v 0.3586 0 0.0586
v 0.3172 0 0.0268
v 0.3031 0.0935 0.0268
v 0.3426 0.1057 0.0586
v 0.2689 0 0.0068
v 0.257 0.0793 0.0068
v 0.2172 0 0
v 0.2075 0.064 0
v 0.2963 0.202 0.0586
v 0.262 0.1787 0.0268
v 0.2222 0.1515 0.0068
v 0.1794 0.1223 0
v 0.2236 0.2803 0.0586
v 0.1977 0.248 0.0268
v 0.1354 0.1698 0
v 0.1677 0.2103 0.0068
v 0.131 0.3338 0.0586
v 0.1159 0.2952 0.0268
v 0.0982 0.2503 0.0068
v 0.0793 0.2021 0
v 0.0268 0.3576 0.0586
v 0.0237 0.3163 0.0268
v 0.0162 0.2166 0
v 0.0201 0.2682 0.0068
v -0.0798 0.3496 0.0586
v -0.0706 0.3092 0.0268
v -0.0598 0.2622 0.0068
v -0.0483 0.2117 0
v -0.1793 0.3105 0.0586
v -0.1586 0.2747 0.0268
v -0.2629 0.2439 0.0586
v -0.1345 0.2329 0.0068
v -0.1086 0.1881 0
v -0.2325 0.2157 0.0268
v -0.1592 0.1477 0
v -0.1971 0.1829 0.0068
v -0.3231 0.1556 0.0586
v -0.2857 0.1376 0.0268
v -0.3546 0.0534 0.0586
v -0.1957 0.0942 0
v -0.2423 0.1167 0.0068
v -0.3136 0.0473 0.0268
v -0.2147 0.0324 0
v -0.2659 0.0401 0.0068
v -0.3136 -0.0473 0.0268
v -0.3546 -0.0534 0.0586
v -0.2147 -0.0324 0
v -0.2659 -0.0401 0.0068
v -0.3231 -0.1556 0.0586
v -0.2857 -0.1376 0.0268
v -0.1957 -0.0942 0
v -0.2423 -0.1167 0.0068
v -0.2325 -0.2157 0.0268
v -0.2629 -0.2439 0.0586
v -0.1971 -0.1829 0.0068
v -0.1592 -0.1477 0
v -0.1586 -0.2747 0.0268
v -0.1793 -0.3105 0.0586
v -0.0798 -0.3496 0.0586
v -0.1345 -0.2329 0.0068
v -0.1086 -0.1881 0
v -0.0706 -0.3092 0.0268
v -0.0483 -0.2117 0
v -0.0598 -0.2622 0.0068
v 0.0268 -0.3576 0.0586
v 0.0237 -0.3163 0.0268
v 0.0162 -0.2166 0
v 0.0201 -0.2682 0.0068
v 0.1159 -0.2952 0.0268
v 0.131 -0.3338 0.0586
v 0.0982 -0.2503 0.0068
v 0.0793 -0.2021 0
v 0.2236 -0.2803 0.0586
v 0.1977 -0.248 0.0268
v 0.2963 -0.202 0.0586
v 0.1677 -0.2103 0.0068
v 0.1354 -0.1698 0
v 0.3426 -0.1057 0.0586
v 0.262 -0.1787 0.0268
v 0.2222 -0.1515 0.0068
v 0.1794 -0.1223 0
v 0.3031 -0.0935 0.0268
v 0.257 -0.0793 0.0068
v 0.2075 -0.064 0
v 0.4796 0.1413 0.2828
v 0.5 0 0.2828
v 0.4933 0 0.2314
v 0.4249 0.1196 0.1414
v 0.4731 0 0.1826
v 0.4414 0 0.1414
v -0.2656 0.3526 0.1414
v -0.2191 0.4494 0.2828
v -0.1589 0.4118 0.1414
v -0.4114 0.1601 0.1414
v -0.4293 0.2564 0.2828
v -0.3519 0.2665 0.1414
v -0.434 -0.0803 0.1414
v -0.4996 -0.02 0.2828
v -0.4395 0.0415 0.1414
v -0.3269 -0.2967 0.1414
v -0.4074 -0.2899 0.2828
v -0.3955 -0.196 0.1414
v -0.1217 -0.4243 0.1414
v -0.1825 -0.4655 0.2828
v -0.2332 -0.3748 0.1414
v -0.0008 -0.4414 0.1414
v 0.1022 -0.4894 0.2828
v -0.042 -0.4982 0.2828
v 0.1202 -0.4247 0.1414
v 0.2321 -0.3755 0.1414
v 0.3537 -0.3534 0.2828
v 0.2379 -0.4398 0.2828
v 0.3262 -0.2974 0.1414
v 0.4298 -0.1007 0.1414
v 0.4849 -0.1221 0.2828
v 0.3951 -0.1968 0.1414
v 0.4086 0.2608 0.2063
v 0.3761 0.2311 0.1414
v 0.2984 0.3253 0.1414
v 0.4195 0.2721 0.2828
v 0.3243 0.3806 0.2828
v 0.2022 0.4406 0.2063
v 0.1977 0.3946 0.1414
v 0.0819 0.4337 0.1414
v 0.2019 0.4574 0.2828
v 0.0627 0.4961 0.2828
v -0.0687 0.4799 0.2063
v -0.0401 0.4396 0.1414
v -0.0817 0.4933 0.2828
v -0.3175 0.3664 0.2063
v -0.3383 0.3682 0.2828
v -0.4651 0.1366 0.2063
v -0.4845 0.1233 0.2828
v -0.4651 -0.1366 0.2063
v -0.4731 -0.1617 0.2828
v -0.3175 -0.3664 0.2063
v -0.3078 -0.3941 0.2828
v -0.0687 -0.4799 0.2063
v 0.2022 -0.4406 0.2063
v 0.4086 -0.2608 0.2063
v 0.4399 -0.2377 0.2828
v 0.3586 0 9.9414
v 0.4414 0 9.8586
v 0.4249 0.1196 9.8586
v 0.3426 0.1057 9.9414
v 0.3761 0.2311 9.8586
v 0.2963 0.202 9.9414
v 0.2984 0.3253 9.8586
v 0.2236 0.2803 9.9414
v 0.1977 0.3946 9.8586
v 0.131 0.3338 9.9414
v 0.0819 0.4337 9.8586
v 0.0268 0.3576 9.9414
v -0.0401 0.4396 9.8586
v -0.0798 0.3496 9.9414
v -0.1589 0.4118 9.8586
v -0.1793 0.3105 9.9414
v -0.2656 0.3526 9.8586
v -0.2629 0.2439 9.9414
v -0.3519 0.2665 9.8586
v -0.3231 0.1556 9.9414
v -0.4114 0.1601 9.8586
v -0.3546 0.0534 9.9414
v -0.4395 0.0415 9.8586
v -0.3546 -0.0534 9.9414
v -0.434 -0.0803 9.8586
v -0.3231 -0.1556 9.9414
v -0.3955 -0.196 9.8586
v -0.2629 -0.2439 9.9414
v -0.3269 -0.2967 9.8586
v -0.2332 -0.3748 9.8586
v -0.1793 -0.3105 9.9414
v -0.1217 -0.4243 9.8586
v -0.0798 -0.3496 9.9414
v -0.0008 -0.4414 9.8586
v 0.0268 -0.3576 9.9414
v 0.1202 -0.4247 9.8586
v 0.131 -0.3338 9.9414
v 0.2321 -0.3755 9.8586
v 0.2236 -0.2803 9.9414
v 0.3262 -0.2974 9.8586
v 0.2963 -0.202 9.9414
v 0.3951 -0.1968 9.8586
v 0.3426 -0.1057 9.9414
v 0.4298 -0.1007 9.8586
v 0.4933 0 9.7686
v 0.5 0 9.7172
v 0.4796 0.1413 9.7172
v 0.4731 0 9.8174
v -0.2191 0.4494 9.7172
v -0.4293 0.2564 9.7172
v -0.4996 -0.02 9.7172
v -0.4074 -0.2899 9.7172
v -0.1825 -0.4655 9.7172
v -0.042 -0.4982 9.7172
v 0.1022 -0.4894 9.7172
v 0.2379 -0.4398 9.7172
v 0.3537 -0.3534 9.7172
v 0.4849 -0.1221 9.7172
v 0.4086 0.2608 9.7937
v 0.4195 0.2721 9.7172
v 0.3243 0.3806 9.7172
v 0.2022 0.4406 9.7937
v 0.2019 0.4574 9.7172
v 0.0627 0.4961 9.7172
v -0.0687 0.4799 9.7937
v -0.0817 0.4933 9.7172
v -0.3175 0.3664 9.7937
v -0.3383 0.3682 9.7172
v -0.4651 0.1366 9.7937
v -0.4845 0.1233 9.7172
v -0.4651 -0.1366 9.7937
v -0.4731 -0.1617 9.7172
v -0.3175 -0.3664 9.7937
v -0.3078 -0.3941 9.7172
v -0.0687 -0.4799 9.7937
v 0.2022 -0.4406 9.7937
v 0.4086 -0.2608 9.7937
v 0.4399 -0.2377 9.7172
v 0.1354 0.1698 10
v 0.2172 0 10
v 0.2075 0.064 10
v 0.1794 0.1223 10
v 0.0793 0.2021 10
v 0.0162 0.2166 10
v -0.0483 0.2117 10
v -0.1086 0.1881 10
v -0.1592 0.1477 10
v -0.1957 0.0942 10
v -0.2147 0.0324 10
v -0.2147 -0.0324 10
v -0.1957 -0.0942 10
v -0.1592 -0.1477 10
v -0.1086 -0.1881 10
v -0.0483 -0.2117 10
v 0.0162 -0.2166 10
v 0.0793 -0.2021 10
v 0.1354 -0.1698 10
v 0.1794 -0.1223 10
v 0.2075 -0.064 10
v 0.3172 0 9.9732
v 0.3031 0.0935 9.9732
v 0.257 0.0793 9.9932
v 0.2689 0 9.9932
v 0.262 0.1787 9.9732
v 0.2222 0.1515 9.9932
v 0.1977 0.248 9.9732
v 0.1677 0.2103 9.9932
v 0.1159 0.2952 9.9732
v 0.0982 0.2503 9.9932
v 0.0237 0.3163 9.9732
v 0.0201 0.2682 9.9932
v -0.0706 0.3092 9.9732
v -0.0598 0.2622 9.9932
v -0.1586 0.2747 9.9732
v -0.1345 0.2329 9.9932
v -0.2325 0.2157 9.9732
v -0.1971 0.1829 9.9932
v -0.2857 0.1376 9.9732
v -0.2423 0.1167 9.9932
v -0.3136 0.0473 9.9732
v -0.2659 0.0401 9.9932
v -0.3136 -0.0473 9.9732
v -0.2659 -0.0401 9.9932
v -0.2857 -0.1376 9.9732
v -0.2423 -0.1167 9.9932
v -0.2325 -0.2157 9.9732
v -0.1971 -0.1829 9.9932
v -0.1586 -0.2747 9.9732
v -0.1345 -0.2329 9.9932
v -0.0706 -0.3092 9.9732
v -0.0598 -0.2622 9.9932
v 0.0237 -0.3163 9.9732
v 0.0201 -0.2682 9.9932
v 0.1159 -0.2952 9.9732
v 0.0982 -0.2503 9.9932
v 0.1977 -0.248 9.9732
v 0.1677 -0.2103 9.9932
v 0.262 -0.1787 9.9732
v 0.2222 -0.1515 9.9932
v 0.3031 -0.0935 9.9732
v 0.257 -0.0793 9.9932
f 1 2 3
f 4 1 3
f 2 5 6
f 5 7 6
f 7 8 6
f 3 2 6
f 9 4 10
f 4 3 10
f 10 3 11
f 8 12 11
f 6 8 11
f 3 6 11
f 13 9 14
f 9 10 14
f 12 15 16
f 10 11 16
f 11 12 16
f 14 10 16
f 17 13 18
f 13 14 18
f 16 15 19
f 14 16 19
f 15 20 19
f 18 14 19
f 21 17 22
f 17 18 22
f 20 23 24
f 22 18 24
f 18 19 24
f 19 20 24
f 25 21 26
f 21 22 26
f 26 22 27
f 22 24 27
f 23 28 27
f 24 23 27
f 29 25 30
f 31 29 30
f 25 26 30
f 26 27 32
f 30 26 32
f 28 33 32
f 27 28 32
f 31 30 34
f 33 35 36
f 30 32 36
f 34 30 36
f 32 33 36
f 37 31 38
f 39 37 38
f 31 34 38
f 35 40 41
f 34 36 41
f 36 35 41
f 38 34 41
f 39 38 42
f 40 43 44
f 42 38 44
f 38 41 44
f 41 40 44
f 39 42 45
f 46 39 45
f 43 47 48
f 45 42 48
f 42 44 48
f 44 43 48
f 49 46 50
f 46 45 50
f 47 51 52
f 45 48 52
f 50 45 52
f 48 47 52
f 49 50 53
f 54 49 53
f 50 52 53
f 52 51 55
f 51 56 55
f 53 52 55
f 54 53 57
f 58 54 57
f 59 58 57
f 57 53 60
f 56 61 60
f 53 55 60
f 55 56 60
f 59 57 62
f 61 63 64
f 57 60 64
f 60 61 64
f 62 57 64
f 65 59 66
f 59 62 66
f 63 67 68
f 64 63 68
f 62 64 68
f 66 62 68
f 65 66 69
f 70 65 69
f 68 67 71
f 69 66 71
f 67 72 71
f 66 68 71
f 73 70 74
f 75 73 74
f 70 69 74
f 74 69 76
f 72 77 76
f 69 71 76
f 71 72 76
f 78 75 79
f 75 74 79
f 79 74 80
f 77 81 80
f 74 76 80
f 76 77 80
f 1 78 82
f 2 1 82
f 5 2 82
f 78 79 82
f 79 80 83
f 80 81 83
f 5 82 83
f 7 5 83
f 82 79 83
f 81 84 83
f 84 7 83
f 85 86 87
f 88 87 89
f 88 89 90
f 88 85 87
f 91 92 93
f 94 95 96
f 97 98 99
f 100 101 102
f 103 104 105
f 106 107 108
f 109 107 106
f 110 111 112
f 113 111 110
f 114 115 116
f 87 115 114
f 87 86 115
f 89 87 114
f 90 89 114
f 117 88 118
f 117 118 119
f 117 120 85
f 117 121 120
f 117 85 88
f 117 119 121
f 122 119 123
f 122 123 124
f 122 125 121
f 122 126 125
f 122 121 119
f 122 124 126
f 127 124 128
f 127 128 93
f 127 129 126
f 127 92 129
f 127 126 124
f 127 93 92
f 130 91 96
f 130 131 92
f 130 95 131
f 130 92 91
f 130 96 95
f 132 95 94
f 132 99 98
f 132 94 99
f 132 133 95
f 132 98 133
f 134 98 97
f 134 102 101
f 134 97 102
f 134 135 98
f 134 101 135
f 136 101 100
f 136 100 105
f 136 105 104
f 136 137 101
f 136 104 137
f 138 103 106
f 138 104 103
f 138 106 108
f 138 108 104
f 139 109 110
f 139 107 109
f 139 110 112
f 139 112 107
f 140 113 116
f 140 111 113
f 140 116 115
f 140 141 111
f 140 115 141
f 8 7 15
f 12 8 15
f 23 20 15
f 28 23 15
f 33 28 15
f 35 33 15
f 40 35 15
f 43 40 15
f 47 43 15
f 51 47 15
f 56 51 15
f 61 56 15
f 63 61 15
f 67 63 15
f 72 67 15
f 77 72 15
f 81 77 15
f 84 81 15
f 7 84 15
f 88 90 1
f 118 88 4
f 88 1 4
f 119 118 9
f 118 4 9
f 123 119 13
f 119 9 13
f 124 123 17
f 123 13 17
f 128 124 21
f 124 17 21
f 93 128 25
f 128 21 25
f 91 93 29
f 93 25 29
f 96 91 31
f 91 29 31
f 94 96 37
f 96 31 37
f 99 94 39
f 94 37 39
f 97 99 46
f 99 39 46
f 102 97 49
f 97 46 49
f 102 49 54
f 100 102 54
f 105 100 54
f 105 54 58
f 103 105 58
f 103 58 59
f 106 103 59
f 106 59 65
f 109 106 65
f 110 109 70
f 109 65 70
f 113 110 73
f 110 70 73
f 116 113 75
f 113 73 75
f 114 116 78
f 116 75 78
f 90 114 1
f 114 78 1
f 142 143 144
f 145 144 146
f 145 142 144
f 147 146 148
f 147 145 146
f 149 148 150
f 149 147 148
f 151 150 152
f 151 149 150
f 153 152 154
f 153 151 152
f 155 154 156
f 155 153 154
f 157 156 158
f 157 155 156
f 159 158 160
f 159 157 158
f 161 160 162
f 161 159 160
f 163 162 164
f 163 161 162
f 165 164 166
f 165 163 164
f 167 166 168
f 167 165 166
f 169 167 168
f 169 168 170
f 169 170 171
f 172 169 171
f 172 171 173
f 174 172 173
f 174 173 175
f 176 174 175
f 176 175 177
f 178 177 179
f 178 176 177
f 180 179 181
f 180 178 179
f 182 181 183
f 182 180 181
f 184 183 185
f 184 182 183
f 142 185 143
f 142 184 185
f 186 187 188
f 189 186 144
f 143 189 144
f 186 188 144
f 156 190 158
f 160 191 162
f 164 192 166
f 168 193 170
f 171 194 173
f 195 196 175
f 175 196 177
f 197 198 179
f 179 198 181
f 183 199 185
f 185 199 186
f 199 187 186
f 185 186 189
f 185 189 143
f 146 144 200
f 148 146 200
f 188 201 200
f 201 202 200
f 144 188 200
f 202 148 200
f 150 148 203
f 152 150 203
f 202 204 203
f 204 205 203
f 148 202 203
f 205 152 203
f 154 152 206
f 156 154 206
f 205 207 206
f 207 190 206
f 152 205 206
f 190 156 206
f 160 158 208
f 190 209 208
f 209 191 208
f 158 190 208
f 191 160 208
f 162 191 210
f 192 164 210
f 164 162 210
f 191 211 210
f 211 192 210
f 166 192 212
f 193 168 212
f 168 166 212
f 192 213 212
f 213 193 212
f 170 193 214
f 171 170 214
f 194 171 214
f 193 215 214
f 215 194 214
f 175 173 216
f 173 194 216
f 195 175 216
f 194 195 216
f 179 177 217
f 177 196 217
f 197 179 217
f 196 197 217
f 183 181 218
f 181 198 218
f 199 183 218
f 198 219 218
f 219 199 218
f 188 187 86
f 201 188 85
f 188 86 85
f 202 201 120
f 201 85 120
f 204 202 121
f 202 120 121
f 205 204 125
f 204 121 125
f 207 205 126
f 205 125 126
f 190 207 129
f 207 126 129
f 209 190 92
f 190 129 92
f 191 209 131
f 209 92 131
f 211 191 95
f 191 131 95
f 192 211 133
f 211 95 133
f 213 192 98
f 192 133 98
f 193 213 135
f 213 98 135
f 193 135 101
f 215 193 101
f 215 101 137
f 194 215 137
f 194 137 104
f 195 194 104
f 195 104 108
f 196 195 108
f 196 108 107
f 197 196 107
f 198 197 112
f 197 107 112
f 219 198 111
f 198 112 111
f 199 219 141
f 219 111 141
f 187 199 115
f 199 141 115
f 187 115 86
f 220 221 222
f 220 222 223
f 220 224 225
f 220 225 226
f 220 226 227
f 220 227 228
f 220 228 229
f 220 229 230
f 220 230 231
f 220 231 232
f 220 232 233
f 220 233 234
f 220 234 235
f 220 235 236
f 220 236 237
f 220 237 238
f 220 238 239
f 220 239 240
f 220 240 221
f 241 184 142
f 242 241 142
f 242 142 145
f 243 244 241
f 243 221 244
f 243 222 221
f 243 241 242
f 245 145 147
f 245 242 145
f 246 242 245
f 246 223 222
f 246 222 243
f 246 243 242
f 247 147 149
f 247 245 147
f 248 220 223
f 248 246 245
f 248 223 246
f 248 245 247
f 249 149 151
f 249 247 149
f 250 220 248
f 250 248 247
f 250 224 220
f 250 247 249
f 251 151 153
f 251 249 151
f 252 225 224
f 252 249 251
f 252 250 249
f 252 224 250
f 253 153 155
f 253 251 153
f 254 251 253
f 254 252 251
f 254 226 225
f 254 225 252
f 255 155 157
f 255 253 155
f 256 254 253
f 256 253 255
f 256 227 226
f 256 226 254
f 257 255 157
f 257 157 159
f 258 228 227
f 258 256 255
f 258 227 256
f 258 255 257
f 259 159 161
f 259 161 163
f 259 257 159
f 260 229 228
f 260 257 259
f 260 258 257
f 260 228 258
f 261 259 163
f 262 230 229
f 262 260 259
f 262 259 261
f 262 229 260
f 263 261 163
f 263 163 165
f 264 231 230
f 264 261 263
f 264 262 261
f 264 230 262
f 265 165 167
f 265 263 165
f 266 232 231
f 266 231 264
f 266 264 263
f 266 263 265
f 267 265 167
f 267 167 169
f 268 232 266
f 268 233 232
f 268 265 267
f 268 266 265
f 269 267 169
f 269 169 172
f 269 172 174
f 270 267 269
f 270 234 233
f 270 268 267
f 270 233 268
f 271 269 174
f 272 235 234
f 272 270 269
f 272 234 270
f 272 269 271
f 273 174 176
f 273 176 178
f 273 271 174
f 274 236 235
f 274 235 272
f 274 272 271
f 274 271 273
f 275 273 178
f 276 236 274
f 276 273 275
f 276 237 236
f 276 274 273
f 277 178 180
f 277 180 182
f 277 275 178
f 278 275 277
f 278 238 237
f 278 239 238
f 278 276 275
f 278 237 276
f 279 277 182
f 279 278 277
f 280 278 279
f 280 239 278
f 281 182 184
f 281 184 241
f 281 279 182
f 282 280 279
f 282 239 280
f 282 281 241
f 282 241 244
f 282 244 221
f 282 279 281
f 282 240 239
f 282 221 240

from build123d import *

# Parameters (mm, degrees)
SKETCH2_R           = 0.5
BOSS_EXTRUDE1_DEPTH = 10
CHAMFER1_SIZE       = 0.2
FILLET1_R           = 0.2
FILLET2_R           = 0.2
FILLET3_R           = 0.2


with BuildPart() as part:
    # Sketch2 → Boss-Extrude1 (new body)
    with BuildSketch(Plane.XY):
        Circle(SKETCH2_R)
    extrude(amount=BOSS_EXTRUDE1_DEPTH)

    # Chamfer1
    chamfer1_edges = [part.edges().sort_by_distance(p)[0] for p in [
        (-0.5, 0, 0),
        (-0.5, 0, 10),
    ]]
    chamfer(chamfer1_edges, length=CHAMFER1_SIZE)

    # Fillet1
    fillet1_edges = [part.edges().sort_by_distance(p)[0] for p in [
        (-0.5, 0, 0.2),
    ]]
    fillet(fillet1_edges, radius=FILLET1_R)

    # Fillet2
    fillet2_edges = [part.edges().sort_by_distance(p)[0] for p in [
        (-0.3, 0, 0),
    ]]
    fillet(fillet2_edges, radius=FILLET2_R)

    # Fillet3
    fillet3_edges = [part.edges().sort_by_distance(p)[0] for p in [
        (-0.5, 0, 9.8),
        (-0.3, 0, 10),
    ]]
    fillet(fillet3_edges, radius=FILLET3_R)


solid = part.part
